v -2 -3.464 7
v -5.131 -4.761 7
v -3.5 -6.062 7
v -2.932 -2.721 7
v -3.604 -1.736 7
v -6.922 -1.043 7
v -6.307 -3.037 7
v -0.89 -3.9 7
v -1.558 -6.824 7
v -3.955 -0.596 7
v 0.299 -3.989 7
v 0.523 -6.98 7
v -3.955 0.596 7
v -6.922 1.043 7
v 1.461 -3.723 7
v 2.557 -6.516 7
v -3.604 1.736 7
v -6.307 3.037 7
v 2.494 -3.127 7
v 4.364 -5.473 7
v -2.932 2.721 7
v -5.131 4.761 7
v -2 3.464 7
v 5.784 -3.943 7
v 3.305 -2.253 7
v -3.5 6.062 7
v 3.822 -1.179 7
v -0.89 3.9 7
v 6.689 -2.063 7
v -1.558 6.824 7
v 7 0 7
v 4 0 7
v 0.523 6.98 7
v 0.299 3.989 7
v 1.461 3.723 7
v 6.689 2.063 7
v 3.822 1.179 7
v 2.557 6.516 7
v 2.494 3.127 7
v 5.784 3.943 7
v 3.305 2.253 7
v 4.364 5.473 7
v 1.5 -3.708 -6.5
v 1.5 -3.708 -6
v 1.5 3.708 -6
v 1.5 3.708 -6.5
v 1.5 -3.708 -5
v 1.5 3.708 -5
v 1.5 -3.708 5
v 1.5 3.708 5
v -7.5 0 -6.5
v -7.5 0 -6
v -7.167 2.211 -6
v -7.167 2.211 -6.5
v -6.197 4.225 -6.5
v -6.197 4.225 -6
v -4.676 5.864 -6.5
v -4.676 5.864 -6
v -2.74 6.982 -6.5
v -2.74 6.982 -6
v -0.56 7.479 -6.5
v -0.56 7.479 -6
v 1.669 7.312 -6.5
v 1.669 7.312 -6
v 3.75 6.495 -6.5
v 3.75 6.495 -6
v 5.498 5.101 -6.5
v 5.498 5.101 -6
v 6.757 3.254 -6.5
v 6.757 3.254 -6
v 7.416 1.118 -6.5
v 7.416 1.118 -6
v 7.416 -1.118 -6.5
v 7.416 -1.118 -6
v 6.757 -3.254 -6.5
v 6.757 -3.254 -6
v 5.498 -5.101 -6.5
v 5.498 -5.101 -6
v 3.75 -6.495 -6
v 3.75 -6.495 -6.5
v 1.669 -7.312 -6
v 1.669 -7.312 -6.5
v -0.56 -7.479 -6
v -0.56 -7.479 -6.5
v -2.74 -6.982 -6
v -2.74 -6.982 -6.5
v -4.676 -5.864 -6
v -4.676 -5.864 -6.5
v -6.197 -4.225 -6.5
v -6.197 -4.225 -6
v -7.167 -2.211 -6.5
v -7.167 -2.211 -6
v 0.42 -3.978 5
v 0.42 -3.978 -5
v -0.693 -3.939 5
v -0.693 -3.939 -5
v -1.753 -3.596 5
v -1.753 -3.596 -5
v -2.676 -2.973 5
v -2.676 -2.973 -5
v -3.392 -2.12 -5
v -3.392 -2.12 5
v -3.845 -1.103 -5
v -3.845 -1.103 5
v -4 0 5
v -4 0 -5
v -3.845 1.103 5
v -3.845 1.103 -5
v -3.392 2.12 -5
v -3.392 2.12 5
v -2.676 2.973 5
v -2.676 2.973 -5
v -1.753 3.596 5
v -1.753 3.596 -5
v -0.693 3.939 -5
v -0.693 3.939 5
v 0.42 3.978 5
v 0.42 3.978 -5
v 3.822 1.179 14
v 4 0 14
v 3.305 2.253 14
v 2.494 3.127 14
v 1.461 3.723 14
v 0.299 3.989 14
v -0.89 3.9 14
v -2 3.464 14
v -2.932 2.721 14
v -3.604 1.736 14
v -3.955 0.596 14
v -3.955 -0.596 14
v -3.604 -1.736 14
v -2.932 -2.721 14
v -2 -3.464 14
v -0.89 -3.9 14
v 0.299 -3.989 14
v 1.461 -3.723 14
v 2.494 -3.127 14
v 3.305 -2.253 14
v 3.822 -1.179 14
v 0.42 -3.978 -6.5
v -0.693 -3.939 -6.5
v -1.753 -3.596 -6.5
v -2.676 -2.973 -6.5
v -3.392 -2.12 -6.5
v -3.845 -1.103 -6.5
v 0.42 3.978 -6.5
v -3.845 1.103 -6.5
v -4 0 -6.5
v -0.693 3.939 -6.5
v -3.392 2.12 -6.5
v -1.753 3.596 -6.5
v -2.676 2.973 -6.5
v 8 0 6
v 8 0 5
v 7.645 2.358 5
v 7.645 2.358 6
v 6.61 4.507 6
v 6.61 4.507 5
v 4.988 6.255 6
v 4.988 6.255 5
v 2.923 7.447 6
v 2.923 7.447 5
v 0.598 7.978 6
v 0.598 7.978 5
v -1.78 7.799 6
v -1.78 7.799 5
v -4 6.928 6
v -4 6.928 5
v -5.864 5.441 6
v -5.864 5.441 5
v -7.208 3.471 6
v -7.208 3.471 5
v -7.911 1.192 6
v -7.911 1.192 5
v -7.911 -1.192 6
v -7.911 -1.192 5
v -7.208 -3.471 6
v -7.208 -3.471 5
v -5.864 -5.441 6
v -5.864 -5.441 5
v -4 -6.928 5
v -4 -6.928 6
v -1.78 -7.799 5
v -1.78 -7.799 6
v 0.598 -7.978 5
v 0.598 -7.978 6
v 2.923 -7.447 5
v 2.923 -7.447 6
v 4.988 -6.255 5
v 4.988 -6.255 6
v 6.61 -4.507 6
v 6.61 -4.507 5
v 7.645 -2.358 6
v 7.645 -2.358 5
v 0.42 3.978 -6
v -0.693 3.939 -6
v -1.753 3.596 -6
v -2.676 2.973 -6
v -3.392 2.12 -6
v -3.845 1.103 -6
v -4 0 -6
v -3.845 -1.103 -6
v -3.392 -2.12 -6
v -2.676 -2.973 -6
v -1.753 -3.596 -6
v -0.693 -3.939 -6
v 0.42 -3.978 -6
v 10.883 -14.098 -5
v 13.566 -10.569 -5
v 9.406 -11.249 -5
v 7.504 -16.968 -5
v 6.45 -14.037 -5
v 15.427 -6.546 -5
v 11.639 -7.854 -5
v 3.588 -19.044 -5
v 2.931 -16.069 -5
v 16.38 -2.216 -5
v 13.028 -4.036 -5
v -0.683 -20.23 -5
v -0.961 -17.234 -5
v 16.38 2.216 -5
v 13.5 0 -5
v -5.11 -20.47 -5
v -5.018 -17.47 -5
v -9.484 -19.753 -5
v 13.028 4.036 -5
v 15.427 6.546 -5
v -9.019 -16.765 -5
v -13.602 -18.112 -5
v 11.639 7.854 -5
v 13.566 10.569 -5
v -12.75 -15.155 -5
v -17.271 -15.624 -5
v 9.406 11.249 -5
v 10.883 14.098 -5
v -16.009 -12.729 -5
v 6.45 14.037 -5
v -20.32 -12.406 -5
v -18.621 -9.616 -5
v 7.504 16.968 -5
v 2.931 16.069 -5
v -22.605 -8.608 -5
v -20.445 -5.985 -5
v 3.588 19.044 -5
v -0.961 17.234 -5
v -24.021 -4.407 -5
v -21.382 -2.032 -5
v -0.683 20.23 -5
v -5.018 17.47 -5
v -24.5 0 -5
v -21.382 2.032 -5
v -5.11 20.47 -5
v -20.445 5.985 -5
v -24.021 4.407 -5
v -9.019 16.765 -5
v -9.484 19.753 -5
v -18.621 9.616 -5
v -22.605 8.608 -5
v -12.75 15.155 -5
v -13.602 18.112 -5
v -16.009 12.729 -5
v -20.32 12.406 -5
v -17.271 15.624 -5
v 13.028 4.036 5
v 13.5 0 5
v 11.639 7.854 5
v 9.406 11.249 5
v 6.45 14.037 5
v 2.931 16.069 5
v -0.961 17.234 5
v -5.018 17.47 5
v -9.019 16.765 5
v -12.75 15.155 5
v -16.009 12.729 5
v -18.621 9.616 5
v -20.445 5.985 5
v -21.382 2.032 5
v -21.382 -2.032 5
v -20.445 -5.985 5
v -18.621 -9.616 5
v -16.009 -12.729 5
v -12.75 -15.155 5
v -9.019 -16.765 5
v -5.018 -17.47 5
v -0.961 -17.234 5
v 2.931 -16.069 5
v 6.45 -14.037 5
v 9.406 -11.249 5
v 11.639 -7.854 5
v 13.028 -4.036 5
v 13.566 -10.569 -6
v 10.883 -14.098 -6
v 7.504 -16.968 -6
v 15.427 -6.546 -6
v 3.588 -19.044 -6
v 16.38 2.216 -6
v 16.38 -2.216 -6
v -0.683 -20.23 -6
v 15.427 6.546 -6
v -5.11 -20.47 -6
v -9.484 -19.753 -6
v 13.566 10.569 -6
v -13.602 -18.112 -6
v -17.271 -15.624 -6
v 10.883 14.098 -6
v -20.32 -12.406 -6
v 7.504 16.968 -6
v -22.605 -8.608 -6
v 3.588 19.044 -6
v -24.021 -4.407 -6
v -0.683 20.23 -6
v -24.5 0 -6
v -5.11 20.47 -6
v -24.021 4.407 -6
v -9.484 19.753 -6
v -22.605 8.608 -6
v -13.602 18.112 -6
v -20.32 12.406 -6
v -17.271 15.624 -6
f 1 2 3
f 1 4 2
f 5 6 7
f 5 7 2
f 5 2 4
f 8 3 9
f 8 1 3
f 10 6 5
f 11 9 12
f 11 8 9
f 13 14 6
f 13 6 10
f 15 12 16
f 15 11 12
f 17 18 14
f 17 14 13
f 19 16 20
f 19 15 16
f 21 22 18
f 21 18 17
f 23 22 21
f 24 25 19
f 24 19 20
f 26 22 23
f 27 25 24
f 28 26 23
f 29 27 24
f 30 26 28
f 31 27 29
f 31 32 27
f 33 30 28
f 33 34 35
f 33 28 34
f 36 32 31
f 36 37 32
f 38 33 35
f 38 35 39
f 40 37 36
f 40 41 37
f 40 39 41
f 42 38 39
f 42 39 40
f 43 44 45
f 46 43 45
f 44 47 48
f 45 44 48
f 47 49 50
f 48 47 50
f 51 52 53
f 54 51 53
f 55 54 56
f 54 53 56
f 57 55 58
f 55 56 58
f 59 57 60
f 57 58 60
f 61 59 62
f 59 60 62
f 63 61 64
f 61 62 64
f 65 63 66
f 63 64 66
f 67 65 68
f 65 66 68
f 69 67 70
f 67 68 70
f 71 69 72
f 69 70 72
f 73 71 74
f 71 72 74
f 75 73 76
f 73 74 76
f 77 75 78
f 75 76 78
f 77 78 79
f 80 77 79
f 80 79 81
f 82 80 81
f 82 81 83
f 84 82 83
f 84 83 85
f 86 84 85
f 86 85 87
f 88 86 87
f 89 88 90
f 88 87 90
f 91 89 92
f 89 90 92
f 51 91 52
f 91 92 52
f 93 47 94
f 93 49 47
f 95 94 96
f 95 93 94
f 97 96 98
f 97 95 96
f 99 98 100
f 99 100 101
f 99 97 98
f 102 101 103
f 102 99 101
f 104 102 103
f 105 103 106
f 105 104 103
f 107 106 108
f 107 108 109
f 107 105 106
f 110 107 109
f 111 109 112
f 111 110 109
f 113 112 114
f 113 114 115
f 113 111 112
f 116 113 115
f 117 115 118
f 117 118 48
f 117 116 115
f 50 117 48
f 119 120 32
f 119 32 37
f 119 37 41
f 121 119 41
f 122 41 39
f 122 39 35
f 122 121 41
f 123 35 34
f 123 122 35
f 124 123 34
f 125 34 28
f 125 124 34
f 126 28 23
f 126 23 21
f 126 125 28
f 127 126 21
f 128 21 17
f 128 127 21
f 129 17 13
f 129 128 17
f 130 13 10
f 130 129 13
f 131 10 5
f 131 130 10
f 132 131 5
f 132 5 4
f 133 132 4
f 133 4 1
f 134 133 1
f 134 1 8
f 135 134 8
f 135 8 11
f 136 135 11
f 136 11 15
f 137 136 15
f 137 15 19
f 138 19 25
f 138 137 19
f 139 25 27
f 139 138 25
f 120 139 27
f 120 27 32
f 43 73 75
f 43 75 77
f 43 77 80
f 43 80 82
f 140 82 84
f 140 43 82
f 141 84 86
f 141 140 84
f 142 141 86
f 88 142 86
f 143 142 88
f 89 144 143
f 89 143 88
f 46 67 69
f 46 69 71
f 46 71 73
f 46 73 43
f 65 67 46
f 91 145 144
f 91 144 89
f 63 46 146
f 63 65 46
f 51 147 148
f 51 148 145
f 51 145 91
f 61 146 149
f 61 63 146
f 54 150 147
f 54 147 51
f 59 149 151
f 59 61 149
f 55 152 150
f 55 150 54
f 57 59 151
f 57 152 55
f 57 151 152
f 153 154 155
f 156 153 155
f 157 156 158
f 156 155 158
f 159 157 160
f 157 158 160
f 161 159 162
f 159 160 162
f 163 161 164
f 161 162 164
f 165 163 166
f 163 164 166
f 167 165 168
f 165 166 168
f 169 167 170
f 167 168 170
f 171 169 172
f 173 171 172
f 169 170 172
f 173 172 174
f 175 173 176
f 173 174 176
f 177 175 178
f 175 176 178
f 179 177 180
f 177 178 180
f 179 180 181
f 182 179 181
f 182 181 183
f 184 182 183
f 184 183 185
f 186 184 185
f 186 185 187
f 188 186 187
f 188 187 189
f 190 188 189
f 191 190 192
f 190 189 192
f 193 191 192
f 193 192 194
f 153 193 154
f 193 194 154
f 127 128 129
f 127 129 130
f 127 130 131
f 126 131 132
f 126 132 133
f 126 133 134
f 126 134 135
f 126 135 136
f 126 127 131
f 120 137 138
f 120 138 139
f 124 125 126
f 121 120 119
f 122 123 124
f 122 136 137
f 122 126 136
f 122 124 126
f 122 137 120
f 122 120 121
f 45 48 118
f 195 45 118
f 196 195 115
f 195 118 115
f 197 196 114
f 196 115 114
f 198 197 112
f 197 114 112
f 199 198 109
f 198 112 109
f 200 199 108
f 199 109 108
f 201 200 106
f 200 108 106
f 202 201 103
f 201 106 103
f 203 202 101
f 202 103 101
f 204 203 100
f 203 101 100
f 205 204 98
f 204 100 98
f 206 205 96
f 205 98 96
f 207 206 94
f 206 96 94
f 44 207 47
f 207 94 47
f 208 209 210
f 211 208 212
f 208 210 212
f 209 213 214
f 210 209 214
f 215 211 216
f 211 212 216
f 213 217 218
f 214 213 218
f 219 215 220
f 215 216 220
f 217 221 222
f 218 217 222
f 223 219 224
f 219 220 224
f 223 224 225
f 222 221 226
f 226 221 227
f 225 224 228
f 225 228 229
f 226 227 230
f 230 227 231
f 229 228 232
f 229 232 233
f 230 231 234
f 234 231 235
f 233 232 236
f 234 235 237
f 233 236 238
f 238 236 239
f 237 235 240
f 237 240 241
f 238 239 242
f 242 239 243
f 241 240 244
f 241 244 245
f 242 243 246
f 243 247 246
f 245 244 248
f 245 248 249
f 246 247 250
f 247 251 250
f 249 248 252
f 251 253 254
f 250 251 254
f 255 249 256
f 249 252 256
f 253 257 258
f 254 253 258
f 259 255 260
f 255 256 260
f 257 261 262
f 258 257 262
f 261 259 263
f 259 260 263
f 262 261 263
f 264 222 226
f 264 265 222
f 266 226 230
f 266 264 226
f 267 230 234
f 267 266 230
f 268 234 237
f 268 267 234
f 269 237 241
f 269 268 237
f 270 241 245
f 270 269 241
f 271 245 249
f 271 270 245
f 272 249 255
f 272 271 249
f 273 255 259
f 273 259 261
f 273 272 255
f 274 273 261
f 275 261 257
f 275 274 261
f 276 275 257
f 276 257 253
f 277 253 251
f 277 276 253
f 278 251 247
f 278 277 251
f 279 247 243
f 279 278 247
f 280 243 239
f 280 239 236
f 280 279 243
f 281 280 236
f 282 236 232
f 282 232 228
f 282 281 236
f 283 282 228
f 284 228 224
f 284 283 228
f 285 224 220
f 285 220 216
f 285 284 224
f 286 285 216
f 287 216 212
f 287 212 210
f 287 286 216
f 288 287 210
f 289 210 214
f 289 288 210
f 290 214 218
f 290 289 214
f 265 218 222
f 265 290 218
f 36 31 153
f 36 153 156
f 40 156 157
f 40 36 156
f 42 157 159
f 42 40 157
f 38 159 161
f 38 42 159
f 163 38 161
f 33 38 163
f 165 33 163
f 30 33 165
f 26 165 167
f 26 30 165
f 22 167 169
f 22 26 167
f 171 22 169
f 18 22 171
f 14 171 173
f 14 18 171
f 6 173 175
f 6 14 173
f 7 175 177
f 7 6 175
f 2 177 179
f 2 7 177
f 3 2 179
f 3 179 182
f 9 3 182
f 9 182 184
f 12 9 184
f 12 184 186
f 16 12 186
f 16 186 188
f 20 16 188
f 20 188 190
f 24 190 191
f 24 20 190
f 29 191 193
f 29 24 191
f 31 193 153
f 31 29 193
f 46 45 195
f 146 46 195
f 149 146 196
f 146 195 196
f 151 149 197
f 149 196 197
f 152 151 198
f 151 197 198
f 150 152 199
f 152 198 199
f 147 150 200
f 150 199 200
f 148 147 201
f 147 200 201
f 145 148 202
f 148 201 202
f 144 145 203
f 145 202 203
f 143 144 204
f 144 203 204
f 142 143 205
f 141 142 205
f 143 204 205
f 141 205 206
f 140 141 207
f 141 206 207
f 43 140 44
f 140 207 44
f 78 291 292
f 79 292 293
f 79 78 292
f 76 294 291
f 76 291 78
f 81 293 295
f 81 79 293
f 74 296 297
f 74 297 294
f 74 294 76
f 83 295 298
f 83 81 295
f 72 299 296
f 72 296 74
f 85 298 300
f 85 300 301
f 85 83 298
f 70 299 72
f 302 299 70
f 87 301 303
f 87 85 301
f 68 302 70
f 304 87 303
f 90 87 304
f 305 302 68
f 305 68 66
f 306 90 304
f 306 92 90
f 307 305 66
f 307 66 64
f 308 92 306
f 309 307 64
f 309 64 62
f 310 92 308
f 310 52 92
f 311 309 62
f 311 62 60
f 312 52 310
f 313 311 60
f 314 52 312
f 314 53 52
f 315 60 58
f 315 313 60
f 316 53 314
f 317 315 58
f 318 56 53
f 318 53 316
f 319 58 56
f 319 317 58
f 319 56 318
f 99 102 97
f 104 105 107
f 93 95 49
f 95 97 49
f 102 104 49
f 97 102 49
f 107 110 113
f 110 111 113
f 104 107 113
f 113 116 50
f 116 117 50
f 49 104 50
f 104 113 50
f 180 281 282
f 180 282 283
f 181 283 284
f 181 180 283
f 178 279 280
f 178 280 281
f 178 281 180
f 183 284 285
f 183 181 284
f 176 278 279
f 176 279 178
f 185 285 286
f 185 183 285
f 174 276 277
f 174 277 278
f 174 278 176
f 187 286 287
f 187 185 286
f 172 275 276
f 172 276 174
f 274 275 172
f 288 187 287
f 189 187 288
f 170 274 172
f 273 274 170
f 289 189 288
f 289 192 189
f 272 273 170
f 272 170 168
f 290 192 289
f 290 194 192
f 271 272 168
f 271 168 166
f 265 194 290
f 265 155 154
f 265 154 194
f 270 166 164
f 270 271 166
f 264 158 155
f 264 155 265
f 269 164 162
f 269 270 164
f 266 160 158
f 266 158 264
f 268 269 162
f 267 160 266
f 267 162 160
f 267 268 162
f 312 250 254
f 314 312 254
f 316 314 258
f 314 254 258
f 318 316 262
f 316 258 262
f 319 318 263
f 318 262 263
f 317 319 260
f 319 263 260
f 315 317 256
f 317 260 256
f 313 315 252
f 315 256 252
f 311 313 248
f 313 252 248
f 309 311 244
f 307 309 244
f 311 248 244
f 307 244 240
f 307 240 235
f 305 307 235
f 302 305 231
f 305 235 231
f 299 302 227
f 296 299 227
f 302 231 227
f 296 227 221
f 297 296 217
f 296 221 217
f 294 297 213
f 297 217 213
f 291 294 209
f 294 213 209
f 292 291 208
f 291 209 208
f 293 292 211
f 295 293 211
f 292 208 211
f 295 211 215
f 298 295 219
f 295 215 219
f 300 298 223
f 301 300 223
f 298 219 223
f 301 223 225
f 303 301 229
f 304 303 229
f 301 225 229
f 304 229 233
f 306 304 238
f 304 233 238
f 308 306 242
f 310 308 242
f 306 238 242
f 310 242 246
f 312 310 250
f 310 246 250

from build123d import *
from build123d.topology import SkipClean

# Parameters (mm, degrees)
SKETCH1_R               = 17.5
BOSS_EXTRUDE1_DEPTH     = 5
SKETCH3_R               = 20.5
SKETCH3_R_2             = 17.5
BOSS_EXTRUDE3_DEPTH     = 1
BOSS_EXTRUDE2_OUTLINE_R = 7.5
BOSS_EXTRUDE2_DEPTH     = 0.5
SKETCH4_R               = 8
BOSS_EXTRUDE5_DEPTH     = 2
BOSS_EXTRUDE6_START     = 7
SKETCH5_R               = 4
BOSS_EXTRUDE6_DEPTH     = 7
CHAMFER1_SIZE           = 1


# Read off the part's stored shape, not the designer's step: Boss-Extrude2
with BuildPart() as part:
    # Sketch1 → Boss-Extrude1 (new, symmetric)
    with BuildSketch(Plane.XY):
        with Locations((-4, 0)):
            Circle(SKETCH1_R)
        with BuildLine():
            Line((1.5, 3.708099244), (1.5, -3.708099244))
            ThreePointArc((1.5, -3.708099244), (-4, 0), (1.5, 3.708099244))
        make_face(mode=Mode.SUBTRACT)
    extrude(amount=BOSS_EXTRUDE1_DEPTH, both=True)

    # Sketch3 → Boss-Extrude3 (add)
    # profile 1 of 2: a face of its own
    with SkipClean():  # the faces are left unmerged after this step: merging them gives an invalid solid
        with BuildSketch(Plane(origin=(0, 0, -5), x_dir=(-1, 0, 0), z_dir=(0, 0, -1))):
            with Locations((4, 0)):
                Circle(SKETCH3_R)
            with Locations(Location((4, 0, 0), (0, 0, 180))):
                Circle(SKETCH3_R_2, mode=Mode.SUBTRACT)
        # profile 2 of 2: a face of its own
        with BuildSketch(Plane(origin=(0, 0, -5), x_dir=(-1, 0, 0), z_dir=(0, 0, -1))):
            with Locations(Location((4, 0, 0), (0, 0, 180))):
                Circle(SKETCH3_R_2)
            with BuildLine():
                Line((-1.5, -3.708099244), (-1.5, 3.708099244))
                ThreePointArc((-1.5, 3.708099244), (4, 0), (-1.5, -3.708099244))
            make_face(mode=Mode.SUBTRACT)
        extrude(amount=BOSS_EXTRUDE3_DEPTH)

    # Boss-Extrude2 outline → Boss-Extrude2 (add)
    with SkipClean():  # the faces are left unmerged after this step: merging them gives an invalid solid
        with BuildSketch(Plane(origin=(0, 0, -6), x_dir=(-1, 0, 0), z_dir=(0, 0, -1))):
            Circle(BOSS_EXTRUDE2_OUTLINE_R)
            with BuildLine():
                ThreePointArc((-1.5, 3.708099244), (4, 0), (-1.5, -3.708099244))
                Line((-1.5, -3.708099244), (-1.5, 3.708099244))
            make_face(mode=Mode.SUBTRACT)
        extrude(amount=BOSS_EXTRUDE2_DEPTH)

    # Sketch4 → Boss-Extrude5 (add)
    with SkipClean():  # the faces are left unmerged after this step: merging them gives an invalid solid
        with BuildSketch(Plane.XY.offset(5)):
            Circle(SKETCH4_R)
        extrude(amount=BOSS_EXTRUDE5_DEPTH)

    # Sketch5 → Boss-Extrude6 (add)
    with SkipClean():  # the faces are left unmerged after this step: merging them gives an invalid solid
        with BuildSketch(Plane.XY.offset(7).offset(BOSS_EXTRUDE6_START)):
            Circle(SKETCH5_R)
        extrude(amount=-BOSS_EXTRUDE6_DEPTH)

    # Chamfer1
    chamfer1_edges = [part.edges().sort_by_distance(p)[0] for p in [
        (-8, 0, 7),
    ]]
    chamfer(chamfer1_edges, length=CHAMFER1_SIZE)


solid = part.part
